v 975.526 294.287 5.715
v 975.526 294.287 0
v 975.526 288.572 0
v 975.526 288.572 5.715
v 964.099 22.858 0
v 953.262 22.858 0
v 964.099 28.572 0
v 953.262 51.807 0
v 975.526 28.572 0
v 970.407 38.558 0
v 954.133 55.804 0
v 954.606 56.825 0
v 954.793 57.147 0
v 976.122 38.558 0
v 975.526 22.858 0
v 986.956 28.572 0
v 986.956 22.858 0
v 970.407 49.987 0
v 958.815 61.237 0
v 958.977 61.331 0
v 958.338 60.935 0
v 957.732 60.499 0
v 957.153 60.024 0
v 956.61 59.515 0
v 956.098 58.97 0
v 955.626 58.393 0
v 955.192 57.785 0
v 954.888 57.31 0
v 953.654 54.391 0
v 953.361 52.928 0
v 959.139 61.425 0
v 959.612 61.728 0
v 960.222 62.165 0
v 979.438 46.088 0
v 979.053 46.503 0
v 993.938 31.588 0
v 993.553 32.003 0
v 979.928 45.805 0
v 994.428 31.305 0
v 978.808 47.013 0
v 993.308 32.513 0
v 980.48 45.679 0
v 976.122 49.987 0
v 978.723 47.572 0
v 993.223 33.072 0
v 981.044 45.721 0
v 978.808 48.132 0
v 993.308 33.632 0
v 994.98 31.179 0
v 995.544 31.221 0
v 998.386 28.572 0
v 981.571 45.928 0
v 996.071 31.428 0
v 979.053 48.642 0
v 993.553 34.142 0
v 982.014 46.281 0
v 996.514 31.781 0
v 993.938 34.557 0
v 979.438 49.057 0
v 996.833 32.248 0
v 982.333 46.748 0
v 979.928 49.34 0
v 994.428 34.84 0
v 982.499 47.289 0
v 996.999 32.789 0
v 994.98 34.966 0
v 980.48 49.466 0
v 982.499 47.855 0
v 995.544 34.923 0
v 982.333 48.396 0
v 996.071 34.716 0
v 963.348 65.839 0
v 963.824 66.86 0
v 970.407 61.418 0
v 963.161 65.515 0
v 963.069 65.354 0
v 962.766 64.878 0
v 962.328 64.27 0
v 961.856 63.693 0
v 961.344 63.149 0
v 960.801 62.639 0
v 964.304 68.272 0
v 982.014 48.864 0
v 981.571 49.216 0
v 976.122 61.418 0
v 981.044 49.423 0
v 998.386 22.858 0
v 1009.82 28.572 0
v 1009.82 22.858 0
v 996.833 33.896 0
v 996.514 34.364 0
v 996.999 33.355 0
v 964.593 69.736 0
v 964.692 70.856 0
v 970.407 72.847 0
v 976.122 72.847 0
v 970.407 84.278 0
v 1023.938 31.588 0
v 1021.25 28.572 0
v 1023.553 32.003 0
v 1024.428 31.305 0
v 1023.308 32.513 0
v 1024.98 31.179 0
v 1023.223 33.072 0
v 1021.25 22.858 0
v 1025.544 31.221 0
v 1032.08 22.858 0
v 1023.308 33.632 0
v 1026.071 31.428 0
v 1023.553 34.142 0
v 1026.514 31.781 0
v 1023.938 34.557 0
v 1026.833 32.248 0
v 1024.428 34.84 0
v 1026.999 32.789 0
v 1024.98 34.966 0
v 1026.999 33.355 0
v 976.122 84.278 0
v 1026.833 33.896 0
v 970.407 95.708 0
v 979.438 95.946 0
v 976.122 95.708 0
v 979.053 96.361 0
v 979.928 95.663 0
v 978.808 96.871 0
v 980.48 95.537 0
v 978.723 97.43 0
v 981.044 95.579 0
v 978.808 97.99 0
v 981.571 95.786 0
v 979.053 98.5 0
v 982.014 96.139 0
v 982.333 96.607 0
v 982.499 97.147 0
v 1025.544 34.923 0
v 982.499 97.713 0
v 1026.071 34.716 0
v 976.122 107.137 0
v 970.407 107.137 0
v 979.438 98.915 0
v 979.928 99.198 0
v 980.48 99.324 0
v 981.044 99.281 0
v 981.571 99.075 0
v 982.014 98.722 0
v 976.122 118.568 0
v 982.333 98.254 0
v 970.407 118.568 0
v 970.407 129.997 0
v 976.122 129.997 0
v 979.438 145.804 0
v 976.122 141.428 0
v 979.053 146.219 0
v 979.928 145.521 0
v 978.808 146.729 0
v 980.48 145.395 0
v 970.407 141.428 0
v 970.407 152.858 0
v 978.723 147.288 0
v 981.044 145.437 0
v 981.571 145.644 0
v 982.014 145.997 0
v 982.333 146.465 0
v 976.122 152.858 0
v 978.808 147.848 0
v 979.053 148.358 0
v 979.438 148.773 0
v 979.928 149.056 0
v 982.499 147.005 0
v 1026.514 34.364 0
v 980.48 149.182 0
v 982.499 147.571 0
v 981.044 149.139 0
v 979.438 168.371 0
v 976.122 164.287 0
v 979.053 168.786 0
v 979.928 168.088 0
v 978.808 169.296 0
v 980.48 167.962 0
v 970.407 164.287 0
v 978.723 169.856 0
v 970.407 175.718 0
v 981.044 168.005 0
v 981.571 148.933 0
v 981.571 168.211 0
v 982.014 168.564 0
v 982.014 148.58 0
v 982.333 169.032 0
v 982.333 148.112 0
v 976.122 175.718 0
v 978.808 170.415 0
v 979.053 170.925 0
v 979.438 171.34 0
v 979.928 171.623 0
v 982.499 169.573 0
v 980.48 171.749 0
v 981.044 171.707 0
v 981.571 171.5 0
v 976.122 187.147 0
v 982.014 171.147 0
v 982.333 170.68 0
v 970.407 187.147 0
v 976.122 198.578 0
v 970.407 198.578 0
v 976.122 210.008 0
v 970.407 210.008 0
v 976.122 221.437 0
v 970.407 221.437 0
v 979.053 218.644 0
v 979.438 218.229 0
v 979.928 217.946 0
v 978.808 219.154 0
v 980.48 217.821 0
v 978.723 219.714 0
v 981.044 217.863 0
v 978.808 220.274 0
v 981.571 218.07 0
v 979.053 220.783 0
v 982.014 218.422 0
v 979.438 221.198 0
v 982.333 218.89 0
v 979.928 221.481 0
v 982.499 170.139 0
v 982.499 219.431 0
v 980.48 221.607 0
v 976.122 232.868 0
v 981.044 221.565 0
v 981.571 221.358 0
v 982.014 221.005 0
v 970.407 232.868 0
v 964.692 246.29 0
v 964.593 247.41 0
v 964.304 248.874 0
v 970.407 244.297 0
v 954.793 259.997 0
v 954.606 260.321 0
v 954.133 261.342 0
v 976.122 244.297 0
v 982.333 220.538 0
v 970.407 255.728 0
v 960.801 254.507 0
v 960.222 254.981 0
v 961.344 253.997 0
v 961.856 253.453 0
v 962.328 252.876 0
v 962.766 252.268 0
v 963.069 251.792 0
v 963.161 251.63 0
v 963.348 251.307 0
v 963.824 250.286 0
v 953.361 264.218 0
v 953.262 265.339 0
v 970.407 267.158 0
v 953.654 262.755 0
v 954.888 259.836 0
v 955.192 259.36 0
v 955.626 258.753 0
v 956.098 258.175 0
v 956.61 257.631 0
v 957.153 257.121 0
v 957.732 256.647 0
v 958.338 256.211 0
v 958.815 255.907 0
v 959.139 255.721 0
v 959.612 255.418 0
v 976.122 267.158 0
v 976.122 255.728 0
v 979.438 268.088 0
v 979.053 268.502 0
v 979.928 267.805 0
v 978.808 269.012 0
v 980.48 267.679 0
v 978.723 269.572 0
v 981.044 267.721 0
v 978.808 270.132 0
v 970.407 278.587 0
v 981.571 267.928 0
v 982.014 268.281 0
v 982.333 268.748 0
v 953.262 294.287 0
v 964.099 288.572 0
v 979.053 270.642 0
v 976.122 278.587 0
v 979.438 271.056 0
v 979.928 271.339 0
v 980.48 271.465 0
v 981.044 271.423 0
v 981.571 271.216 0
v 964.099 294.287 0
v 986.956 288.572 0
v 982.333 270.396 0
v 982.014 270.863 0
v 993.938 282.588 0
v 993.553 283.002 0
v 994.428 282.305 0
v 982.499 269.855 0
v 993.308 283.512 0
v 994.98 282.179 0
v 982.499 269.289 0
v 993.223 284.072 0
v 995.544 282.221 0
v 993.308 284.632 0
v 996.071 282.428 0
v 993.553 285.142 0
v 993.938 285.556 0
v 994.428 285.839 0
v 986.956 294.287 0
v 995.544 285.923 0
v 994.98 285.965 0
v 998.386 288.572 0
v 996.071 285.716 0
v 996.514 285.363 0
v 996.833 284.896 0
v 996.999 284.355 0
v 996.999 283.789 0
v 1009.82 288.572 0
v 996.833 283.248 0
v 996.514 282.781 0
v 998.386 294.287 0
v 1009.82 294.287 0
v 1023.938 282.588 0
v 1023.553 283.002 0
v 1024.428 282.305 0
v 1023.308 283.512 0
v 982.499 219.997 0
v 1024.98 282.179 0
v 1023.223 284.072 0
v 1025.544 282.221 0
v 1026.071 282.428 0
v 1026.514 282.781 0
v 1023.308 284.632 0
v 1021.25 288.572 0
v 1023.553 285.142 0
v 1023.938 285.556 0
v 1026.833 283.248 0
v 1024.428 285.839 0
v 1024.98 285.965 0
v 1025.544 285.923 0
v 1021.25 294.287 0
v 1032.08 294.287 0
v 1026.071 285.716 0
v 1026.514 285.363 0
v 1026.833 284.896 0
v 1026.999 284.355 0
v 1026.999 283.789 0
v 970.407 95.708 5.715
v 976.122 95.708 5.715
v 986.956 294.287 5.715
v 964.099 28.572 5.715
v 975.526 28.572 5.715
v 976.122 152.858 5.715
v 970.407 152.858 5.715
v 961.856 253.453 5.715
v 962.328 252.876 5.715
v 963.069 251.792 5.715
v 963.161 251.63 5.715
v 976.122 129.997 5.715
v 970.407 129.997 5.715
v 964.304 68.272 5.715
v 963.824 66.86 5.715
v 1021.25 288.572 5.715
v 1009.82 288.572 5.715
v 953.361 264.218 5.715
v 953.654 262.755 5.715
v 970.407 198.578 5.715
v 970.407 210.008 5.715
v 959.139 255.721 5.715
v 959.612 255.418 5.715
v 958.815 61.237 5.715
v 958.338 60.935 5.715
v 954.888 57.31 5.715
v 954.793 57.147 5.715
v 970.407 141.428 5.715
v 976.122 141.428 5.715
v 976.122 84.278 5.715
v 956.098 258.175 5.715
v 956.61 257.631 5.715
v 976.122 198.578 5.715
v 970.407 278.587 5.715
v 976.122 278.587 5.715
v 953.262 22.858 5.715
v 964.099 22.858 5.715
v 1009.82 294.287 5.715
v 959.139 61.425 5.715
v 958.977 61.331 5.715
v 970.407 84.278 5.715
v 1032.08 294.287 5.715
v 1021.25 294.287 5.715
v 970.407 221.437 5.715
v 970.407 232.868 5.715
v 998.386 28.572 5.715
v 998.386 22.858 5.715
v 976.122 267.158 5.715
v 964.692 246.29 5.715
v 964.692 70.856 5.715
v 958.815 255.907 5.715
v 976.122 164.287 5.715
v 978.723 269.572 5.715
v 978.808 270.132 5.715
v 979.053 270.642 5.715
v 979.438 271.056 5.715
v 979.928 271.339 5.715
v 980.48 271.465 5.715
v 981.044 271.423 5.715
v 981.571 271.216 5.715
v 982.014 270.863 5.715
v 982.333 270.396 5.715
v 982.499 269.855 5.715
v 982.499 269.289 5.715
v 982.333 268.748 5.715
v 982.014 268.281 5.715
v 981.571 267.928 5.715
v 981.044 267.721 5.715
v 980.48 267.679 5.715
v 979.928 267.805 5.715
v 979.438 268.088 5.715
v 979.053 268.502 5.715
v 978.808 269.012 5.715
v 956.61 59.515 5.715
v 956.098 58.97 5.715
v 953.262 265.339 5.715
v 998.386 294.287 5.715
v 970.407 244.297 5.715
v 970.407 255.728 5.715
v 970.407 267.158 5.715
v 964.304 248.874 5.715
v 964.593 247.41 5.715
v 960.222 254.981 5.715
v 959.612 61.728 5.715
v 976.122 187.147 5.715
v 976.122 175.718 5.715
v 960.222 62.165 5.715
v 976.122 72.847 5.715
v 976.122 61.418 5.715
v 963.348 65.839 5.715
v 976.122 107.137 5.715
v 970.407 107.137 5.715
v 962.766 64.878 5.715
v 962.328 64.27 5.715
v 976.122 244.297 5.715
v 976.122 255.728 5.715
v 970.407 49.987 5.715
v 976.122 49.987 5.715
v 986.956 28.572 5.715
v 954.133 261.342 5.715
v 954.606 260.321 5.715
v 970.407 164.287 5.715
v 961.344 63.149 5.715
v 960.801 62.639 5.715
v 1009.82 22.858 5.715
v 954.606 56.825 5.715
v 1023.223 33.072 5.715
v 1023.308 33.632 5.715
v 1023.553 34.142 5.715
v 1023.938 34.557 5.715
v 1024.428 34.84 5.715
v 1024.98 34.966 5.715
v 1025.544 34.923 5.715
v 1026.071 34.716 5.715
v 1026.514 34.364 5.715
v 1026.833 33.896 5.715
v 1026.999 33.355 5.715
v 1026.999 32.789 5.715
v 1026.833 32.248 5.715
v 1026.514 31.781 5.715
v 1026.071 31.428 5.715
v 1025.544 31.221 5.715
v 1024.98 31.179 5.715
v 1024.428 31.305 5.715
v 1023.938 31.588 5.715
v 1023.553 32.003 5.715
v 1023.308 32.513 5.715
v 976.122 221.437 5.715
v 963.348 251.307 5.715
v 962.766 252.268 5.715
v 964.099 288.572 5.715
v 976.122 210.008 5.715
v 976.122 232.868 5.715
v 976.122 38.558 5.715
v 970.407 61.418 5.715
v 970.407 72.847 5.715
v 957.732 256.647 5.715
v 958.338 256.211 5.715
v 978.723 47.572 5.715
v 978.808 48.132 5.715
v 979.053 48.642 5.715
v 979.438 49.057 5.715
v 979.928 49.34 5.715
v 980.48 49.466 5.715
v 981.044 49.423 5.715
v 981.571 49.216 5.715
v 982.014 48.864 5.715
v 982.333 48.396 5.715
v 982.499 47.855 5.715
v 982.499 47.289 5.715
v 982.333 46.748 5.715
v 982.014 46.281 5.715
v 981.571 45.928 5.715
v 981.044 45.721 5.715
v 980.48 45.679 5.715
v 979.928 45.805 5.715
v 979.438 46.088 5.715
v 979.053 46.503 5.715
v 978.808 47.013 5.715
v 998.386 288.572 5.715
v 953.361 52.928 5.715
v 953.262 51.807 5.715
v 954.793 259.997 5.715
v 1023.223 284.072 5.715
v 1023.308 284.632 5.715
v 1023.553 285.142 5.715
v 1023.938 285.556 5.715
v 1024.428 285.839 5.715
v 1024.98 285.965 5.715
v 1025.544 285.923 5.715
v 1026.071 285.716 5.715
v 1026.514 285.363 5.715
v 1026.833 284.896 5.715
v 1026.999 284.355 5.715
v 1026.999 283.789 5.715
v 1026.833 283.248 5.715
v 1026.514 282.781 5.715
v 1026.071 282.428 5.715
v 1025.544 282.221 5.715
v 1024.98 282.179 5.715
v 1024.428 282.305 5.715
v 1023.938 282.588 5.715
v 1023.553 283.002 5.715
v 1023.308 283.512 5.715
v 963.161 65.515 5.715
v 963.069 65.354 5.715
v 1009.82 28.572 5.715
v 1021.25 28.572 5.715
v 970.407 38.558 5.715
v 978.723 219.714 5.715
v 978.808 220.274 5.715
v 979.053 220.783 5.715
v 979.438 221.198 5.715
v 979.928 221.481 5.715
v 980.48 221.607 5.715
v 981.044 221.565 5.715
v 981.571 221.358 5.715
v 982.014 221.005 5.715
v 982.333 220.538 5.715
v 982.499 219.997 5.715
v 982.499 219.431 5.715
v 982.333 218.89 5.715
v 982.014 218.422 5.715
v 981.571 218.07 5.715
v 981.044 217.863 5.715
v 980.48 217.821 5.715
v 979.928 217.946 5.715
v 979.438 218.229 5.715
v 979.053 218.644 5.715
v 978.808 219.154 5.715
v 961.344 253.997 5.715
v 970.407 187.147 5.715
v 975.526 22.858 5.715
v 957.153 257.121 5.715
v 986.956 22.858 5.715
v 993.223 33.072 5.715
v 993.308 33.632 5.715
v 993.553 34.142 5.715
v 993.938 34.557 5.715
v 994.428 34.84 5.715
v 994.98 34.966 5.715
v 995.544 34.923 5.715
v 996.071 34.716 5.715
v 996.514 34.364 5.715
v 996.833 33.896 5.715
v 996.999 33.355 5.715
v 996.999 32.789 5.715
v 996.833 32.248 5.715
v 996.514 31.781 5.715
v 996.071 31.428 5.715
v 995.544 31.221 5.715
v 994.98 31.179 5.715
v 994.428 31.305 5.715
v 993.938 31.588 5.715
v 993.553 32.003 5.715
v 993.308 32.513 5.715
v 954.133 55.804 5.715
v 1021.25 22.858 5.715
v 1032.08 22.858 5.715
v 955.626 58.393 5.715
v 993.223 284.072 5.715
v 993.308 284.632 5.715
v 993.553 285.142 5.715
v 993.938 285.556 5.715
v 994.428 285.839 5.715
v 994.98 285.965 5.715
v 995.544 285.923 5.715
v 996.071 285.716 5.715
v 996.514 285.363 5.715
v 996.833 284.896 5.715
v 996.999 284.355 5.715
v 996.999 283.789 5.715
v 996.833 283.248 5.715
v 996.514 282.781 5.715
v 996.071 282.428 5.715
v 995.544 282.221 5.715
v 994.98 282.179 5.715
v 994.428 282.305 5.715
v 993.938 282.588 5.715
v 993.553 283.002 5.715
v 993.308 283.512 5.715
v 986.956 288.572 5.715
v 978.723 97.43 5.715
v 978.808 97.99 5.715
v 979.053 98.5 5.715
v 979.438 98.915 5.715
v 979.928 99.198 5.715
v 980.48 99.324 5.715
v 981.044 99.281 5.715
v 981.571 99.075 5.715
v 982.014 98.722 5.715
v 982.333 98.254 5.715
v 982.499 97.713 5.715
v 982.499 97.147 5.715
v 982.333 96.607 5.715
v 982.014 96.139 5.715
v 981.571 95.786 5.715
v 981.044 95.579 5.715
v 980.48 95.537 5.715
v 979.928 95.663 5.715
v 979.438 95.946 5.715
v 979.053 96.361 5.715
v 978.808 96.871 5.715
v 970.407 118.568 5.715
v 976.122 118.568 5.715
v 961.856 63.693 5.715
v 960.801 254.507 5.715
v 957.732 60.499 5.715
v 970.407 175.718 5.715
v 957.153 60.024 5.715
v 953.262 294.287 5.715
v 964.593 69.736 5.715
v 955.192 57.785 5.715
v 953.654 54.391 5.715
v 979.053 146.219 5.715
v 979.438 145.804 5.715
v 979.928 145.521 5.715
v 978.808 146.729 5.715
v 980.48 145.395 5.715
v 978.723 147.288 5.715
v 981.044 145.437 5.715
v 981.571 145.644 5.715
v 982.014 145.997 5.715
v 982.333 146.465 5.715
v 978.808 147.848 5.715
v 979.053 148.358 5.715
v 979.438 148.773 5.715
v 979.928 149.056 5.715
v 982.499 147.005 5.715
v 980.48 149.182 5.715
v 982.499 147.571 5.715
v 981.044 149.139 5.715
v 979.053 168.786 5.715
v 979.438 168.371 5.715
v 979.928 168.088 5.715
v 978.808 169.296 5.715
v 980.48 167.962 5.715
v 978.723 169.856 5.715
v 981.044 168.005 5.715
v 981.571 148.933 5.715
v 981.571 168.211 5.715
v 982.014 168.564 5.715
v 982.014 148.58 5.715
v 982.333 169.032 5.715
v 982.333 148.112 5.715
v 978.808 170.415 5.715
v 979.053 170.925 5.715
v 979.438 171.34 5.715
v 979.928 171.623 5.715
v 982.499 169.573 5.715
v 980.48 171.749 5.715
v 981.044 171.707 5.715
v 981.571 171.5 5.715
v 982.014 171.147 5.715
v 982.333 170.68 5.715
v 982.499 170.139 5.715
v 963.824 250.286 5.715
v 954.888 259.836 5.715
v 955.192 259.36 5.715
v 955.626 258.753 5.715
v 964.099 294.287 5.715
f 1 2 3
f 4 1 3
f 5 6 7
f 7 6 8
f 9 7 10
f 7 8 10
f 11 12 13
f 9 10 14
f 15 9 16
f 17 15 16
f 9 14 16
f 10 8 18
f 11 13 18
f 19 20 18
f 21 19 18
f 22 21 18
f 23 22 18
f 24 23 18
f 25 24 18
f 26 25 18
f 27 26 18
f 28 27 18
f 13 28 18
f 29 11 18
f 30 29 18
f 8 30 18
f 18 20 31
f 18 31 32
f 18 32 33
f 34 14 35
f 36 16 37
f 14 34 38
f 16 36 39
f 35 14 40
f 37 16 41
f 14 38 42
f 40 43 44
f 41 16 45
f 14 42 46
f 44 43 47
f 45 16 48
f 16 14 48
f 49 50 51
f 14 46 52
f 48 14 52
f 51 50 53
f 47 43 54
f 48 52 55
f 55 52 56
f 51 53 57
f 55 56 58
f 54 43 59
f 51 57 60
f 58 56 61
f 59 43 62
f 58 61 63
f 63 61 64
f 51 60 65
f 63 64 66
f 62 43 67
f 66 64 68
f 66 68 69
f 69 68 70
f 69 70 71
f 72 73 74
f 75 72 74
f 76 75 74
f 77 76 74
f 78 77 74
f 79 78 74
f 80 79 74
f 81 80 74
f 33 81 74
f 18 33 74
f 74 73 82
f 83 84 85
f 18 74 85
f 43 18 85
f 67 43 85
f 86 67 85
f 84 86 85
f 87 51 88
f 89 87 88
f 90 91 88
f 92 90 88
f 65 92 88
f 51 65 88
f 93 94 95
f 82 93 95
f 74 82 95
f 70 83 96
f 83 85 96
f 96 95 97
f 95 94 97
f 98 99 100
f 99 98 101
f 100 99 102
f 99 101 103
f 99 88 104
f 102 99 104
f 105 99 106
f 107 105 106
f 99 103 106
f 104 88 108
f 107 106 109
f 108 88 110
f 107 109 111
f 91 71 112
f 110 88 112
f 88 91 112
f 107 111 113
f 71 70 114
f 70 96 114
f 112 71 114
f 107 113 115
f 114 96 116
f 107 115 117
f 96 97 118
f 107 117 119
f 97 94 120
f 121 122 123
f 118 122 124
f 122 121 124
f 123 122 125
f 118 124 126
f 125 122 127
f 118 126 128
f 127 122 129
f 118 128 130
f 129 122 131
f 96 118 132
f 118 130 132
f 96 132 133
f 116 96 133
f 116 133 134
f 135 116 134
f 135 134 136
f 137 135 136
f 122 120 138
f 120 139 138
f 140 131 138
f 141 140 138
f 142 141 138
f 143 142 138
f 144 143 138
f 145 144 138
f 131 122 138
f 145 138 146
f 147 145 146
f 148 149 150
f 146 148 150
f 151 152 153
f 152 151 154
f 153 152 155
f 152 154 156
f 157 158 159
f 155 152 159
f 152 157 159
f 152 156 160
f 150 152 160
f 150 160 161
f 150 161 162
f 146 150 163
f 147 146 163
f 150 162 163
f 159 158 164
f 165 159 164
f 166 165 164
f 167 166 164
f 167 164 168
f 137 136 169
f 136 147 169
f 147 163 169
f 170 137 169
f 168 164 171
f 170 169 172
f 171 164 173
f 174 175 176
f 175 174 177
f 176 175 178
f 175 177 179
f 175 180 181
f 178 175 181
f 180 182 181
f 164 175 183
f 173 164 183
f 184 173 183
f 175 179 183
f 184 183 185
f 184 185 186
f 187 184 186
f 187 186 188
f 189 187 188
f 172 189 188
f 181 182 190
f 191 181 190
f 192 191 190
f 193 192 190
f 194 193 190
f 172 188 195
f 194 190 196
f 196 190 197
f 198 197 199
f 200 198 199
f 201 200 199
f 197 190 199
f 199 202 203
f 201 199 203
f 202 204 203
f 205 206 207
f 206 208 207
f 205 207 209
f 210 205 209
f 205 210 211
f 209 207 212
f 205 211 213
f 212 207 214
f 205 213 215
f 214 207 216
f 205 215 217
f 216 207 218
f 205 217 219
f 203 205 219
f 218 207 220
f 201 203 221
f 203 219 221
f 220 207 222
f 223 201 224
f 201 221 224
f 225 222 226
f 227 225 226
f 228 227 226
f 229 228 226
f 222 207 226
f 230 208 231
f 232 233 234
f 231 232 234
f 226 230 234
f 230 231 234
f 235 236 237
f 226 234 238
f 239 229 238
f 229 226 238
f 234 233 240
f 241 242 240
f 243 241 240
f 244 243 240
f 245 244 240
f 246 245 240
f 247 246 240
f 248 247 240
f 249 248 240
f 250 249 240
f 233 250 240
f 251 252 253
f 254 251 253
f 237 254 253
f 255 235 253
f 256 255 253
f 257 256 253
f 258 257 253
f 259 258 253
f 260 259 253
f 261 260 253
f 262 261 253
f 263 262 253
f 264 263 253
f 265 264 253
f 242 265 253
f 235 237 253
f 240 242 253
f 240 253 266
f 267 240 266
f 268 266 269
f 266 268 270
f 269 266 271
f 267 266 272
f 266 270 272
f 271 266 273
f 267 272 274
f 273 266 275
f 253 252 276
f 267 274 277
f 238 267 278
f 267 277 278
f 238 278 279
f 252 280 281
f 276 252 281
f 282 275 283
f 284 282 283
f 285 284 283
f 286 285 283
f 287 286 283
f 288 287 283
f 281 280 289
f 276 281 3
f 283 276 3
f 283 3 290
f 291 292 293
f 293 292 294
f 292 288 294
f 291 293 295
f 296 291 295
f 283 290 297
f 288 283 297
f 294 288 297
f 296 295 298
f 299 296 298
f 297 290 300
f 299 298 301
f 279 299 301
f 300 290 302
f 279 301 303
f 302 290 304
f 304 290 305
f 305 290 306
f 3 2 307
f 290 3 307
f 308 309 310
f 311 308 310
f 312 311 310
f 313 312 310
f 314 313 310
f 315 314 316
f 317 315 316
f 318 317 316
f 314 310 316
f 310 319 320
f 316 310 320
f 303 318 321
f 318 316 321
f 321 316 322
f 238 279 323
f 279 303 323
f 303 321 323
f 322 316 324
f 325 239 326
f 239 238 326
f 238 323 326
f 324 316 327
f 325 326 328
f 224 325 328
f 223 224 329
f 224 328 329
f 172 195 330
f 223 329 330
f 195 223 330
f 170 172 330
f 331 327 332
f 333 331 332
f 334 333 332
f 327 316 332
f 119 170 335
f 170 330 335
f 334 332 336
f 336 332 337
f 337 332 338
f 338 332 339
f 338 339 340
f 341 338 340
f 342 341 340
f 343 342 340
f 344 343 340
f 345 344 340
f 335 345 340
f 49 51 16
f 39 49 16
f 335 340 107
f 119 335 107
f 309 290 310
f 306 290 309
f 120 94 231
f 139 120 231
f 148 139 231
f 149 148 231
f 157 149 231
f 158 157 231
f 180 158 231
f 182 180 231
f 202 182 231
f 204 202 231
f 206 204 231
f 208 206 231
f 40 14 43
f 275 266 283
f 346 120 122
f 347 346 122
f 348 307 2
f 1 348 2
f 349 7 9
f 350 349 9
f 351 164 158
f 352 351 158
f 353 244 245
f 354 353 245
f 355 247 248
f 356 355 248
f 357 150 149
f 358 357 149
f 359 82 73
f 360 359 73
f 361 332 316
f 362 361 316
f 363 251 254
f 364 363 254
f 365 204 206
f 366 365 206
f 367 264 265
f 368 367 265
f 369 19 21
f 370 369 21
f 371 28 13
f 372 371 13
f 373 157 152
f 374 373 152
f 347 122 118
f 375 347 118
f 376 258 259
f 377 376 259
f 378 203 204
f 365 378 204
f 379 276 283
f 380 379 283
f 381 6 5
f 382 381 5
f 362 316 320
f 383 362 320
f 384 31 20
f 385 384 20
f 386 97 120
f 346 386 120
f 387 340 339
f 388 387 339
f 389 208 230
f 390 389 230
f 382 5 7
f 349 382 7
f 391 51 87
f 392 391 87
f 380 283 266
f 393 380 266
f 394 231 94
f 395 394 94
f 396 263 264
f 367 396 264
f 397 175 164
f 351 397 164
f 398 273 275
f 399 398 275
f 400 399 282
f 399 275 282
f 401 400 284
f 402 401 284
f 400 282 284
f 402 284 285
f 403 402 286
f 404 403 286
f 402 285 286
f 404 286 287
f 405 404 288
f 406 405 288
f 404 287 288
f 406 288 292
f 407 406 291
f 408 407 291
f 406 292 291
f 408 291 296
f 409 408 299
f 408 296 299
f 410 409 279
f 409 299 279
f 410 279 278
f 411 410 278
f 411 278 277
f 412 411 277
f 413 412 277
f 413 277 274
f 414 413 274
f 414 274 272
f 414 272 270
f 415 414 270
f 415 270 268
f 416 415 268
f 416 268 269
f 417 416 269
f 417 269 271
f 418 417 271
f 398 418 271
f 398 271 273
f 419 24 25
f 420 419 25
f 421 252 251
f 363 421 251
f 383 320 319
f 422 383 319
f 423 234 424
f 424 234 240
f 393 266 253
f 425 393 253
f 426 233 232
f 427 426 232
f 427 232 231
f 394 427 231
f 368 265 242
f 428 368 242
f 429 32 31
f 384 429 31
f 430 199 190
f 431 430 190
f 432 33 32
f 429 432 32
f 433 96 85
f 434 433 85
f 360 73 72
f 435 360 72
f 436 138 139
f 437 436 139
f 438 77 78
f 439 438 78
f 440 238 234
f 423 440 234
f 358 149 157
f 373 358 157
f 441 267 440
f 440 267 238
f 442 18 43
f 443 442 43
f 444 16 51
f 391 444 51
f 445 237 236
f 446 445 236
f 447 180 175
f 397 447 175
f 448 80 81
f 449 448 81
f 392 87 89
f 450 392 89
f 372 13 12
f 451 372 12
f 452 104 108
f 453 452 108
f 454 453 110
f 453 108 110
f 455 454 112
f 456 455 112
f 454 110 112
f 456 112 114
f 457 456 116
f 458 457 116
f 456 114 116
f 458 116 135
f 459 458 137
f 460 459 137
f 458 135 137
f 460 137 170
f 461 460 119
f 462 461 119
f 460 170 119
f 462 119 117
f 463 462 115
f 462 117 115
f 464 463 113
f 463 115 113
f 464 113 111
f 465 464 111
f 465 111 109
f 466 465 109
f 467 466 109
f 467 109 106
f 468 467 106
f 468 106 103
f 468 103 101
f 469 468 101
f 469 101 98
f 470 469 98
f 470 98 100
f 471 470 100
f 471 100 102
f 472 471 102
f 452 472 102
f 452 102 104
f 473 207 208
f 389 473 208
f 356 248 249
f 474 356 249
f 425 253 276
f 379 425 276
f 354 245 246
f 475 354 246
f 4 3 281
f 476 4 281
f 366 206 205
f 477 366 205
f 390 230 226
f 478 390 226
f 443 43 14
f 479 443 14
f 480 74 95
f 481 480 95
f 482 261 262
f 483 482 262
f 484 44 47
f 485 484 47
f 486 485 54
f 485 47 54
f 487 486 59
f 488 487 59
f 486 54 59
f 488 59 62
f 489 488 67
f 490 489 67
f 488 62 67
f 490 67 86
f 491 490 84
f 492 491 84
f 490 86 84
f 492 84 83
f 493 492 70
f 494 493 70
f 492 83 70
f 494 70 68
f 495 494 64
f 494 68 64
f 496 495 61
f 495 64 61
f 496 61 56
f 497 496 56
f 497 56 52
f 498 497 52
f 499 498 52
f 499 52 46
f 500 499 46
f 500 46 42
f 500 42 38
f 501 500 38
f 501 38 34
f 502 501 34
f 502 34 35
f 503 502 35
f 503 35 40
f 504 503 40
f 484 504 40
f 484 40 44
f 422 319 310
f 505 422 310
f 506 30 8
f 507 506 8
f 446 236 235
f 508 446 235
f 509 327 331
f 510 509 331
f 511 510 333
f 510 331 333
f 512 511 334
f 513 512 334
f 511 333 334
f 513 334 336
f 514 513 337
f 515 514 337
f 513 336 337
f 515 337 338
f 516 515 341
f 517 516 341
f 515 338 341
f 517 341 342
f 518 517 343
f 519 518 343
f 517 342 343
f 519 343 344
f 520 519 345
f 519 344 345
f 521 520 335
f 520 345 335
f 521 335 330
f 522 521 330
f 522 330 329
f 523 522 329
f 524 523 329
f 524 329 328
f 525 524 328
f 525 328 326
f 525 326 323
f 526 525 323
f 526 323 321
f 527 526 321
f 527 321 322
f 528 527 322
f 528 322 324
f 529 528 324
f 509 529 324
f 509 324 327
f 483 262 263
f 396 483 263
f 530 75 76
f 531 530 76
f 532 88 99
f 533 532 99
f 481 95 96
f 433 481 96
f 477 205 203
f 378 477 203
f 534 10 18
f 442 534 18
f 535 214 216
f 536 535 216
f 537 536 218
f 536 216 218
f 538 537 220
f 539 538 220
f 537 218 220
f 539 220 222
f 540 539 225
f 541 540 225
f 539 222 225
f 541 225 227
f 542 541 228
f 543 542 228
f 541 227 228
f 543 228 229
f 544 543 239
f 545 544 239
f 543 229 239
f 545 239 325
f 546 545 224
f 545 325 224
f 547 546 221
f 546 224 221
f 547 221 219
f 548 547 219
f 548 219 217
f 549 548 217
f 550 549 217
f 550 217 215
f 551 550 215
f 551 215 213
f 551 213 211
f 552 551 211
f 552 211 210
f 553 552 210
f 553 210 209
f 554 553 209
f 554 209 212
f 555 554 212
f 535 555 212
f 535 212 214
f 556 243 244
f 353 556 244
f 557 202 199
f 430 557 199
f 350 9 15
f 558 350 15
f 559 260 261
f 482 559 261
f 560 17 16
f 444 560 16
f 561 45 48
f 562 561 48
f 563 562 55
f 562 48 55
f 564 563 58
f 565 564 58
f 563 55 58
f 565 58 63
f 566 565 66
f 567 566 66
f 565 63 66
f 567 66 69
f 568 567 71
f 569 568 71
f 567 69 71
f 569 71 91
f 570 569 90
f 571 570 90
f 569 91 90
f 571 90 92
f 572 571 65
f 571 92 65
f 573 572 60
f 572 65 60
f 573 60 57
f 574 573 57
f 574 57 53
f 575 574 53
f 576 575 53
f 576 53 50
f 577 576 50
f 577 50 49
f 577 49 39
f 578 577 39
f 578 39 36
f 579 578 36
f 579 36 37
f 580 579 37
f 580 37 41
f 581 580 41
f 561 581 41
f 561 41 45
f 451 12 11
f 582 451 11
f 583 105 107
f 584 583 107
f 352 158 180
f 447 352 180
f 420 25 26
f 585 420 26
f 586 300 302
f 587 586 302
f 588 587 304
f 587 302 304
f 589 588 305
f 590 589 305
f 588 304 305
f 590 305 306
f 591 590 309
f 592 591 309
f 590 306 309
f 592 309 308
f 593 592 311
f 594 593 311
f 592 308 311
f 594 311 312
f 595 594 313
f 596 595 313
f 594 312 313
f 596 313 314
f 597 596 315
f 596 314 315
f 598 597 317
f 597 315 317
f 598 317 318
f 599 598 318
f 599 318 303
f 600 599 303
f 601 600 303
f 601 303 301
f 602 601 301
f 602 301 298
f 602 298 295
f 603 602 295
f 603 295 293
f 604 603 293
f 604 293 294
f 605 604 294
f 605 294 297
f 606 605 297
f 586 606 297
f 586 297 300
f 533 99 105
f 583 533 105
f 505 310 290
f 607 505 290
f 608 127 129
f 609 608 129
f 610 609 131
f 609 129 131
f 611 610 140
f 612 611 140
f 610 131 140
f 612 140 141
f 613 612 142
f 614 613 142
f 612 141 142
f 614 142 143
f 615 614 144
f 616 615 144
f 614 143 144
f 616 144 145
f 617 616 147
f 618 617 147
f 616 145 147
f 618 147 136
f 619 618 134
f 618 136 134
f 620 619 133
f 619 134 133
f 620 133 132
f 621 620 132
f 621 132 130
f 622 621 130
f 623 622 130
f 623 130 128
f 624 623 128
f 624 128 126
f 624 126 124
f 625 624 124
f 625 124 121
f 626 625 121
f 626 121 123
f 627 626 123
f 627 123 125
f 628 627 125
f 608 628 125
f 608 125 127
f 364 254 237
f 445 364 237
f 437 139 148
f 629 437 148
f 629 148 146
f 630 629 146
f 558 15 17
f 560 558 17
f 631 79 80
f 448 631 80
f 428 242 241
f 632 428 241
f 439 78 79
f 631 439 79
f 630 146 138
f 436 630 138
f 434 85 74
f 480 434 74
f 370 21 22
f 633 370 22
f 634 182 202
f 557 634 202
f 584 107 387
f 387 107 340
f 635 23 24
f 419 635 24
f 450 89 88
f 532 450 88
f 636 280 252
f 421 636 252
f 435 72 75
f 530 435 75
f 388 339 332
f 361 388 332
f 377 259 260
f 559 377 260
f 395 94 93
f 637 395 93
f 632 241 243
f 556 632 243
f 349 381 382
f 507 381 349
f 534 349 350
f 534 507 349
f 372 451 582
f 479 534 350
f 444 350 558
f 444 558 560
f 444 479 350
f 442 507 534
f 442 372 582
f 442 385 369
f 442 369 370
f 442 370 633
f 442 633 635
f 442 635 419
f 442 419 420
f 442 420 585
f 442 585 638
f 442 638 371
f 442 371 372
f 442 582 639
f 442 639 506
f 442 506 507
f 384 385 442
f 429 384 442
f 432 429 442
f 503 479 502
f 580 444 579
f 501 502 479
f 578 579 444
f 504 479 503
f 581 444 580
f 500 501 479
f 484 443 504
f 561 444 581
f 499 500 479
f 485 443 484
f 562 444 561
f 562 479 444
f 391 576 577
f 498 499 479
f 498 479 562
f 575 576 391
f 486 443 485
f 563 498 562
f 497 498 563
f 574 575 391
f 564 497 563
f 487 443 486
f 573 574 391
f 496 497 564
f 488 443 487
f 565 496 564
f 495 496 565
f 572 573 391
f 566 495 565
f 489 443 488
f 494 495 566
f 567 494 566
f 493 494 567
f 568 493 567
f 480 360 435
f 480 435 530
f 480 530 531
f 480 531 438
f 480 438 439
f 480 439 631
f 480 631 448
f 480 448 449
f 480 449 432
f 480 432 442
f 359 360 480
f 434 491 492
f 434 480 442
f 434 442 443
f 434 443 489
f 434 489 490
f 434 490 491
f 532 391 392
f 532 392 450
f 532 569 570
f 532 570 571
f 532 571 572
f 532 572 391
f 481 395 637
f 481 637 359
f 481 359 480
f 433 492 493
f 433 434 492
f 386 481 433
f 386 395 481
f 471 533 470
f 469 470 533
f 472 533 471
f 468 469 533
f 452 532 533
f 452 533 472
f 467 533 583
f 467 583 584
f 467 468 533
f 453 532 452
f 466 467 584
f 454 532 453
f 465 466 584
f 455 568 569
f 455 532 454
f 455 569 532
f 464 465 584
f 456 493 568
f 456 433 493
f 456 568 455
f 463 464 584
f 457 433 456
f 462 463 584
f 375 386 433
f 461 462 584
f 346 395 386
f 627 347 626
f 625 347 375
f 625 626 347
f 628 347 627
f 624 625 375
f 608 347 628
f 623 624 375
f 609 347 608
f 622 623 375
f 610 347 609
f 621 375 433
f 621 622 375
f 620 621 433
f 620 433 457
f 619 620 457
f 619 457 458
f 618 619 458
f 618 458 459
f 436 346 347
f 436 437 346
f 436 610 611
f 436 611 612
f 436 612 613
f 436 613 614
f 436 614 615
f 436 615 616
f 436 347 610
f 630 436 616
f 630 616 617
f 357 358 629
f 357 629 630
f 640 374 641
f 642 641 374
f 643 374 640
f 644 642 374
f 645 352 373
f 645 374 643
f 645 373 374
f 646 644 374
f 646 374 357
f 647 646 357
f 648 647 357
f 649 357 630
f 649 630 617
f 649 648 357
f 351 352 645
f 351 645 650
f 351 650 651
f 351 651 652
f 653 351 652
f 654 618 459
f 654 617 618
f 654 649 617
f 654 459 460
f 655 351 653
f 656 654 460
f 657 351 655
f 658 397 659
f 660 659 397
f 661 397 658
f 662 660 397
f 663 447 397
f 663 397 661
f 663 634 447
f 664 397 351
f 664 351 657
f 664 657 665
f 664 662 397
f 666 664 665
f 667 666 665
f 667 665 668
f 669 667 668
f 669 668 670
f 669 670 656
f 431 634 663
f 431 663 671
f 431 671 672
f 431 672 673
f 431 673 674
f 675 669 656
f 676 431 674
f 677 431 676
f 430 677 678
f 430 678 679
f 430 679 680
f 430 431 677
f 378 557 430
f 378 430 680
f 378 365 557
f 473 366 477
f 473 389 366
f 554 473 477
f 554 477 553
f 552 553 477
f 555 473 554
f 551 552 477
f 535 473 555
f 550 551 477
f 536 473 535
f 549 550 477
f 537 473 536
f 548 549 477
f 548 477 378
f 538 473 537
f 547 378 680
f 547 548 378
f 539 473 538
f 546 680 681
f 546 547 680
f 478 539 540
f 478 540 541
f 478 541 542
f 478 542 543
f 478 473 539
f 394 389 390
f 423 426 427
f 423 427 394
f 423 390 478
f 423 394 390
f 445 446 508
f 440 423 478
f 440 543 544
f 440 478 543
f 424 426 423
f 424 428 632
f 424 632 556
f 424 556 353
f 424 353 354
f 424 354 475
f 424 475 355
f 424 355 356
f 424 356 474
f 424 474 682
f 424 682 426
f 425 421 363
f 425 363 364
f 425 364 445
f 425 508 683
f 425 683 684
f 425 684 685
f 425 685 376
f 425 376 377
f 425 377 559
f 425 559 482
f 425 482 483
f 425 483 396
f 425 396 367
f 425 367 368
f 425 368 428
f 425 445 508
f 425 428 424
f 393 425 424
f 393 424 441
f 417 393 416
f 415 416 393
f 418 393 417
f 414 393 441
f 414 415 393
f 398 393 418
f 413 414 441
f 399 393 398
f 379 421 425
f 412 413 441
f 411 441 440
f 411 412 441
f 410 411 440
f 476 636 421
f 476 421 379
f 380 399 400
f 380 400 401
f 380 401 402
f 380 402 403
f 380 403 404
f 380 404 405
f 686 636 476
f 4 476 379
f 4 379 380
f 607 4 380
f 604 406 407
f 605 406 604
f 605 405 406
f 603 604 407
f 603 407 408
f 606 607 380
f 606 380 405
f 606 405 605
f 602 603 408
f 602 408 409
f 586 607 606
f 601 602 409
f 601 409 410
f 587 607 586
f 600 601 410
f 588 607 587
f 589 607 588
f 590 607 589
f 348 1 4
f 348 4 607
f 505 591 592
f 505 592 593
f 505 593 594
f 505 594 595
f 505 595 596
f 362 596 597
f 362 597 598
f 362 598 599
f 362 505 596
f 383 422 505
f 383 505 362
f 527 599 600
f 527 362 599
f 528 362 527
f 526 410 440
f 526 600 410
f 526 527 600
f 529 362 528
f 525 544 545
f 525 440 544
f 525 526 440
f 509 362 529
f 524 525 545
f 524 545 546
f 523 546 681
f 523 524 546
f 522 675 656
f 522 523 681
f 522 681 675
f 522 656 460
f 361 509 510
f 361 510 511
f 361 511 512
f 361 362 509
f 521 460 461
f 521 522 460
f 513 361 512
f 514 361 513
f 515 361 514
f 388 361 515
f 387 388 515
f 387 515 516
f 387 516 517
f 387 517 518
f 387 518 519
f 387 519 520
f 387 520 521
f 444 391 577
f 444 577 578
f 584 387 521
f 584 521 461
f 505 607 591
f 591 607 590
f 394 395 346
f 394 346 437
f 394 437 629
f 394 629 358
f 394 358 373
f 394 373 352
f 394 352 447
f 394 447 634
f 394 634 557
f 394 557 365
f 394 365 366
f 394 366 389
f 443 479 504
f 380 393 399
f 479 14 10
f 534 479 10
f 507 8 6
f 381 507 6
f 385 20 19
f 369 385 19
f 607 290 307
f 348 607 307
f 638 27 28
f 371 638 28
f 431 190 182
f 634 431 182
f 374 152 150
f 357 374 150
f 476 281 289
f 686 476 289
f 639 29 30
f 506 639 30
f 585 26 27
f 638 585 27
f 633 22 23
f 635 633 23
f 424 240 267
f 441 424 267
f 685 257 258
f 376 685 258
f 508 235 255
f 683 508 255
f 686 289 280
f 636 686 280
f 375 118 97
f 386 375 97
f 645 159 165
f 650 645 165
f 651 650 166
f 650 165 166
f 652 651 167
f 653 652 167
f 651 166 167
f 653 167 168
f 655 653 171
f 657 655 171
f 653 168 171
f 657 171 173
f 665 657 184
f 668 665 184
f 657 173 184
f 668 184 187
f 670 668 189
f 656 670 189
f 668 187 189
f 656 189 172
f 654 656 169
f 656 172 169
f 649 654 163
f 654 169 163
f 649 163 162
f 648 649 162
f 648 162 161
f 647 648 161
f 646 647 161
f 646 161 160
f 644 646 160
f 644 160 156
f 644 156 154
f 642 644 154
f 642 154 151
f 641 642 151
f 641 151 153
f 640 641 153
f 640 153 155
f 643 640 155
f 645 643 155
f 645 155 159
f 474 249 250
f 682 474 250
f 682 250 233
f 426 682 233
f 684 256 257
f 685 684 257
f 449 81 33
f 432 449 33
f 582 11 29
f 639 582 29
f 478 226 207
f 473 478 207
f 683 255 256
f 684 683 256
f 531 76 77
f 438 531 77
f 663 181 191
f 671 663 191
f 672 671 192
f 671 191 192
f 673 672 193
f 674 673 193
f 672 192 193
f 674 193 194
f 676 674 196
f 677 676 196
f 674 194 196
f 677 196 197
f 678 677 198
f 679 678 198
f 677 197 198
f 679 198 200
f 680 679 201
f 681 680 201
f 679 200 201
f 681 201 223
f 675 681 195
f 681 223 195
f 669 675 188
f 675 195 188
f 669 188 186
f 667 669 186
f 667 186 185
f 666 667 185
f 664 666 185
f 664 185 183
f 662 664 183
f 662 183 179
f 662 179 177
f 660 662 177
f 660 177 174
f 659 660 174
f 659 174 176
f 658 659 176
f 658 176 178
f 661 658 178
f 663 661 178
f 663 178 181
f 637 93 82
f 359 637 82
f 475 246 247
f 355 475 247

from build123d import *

# Parameters (mm, degrees)
BOSS_EXTRUDE1_DEPTH   = 5.715
F_6_CLEARANCE_HOLE1_D = 3.7973


with BuildPart() as part:
    # Model → Boss-Extrude1 (new body)
    with BuildSketch(Plane.XY):
        Polygon((953.262, 22.8575), (964.099, 22.8575), (964.099, 28.5722), (975.526, 28.5722), (975.526, 22.8575), (986.956, 22.8575), (986.956, 28.5722), (998.386, 28.5722), (998.386, 22.8575), (1009.82, 22.8575), (1009.82, 28.5722), (1021.25, 28.5722), (1021.25, 22.8575), (1032.08, 22.8575), (1032.08, 28.5722), (1032.08, 288.572), (1032.08, 294.287), (1021.25, 294.287), (1021.25, 288.572), (1009.82, 288.572), (1009.82, 294.287), (998.386, 294.287), (998.386, 288.572), (986.956, 288.572), (986.956, 294.287), (975.526, 294.287), (975.526, 288.572), (964.099, 288.572), (964.099, 294.287), (953.262, 294.287), (953.262, 288.572), (953.262, 265.712), (953.262, 265.339), (953.361, 264.218), (953.654, 262.755), (954.133, 261.342), (954.606, 260.321), (954.793, 259.997), (954.888, 259.836), (955.192, 259.36), (955.626, 258.753), (956.098, 258.175), (956.61, 257.631), (957.153, 257.121), (957.732, 256.647), (958.338, 256.211), (958.815, 255.907), (958.977, 255.814), (959.139, 255.721), (959.612, 255.418), (960.222, 254.981), (960.801, 254.507), (961.344, 253.997), (961.856, 253.453), (962.328, 252.876), (962.766, 252.268), (963.069, 251.792), (963.161, 251.63), (963.348, 251.307), (963.824, 250.286), (964.304, 248.874), (964.593, 247.41), (964.692, 246.29), (964.692, 245.915), (964.692, 71.2294), (964.692, 70.8561), (964.593, 69.7357), (964.304, 68.272), (963.824, 66.8595), (963.348, 65.8386), (963.161, 65.5147), (963.069, 65.3535), (962.766, 64.878), (962.328, 64.2705), (961.856, 63.693), (961.344, 63.1486), (960.801, 62.6389), (960.222, 62.1647), (959.612, 61.728), (959.139, 61.4246), (958.977, 61.3311), (958.815, 61.2373), (958.338, 60.9353), (957.732, 60.4986), (957.153, 60.0244), (956.61, 59.5147), (956.098, 58.9703), (955.626, 58.3928), (955.192, 57.7854), (954.888, 57.3098), (954.793, 57.1472), (954.606, 56.8247), (954.133, 55.8038), (953.654, 54.3913), (953.361, 52.9276), (953.262, 51.8072), (953.262, 51.4325), (953.262, 28.5722), align=None)
        Polygon((970.407, 272.872), (970.407, 278.587), (976.122, 278.587), (976.122, 267.158), (970.407, 267.158), align=None, mode=Mode.SUBTRACT)
        Polygon((970.407, 250.012), (970.407, 255.728), (976.122, 255.728), (976.122, 244.297), (970.407, 244.297), align=None, mode=Mode.SUBTRACT)
        Polygon((970.407, 227.153), (970.407, 232.868), (976.122, 232.868), (976.122, 221.437), (970.407, 221.437), align=None, mode=Mode.SUBTRACT)
        Polygon((970.407, 204.293), (970.407, 210.008), (976.122, 210.008), (976.122, 198.578), (970.407, 198.578), align=None, mode=Mode.SUBTRACT)
        Polygon((970.407, 181.433), (970.407, 187.147), (976.122, 187.147), (976.122, 175.718), (970.407, 175.718), align=None, mode=Mode.SUBTRACT)
        Polygon((970.407, 158.572), (970.407, 164.287), (976.122, 164.287), (976.122, 152.858), (970.407, 152.858), align=None, mode=Mode.SUBTRACT)
        Polygon((970.407, 135.712), (970.407, 141.428), (976.122, 141.428), (976.122, 129.997), (970.407, 129.997), align=None, mode=Mode.SUBTRACT)
        Polygon((970.407, 112.853), (970.407, 118.568), (976.122, 118.568), (976.122, 107.137), (970.407, 107.137), align=None, mode=Mode.SUBTRACT)
        Polygon((970.407, 89.9929), (970.407, 95.7076), (976.122, 95.7076), (976.122, 84.2779), (970.407, 84.2779), align=None, mode=Mode.SUBTRACT)
        Polygon((970.407, 67.1326), (970.407, 72.8472), (976.122, 72.8472), (976.122, 61.4179), (970.407, 61.4179), align=None, mode=Mode.SUBTRACT)
        Polygon((970.407, 44.2722), (970.407, 49.9868), (976.122, 49.9868), (976.122, 38.5576), (970.407, 38.5576), align=None, mode=Mode.SUBTRACT)
    extrude(amount=BOSS_EXTRUDE1_DEPTH)

    # #6 Clearance Hole1 (through all)
    with Locations(Plane.XY.offset(5.715)):
        with Locations((1025.122, 284.072), (995.122, 284.072), (980.622, 269.572), (980.622, 219.713875), (980.622, 169.85575), (980.622, 147.28845), (980.622, 97.430325), (980.622, 47.5722), (995.122, 33.0722), (1025.122, 33.0722)):
            Hole(F_6_CLEARANCE_HOLE1_D / 2)


solid = part.part
